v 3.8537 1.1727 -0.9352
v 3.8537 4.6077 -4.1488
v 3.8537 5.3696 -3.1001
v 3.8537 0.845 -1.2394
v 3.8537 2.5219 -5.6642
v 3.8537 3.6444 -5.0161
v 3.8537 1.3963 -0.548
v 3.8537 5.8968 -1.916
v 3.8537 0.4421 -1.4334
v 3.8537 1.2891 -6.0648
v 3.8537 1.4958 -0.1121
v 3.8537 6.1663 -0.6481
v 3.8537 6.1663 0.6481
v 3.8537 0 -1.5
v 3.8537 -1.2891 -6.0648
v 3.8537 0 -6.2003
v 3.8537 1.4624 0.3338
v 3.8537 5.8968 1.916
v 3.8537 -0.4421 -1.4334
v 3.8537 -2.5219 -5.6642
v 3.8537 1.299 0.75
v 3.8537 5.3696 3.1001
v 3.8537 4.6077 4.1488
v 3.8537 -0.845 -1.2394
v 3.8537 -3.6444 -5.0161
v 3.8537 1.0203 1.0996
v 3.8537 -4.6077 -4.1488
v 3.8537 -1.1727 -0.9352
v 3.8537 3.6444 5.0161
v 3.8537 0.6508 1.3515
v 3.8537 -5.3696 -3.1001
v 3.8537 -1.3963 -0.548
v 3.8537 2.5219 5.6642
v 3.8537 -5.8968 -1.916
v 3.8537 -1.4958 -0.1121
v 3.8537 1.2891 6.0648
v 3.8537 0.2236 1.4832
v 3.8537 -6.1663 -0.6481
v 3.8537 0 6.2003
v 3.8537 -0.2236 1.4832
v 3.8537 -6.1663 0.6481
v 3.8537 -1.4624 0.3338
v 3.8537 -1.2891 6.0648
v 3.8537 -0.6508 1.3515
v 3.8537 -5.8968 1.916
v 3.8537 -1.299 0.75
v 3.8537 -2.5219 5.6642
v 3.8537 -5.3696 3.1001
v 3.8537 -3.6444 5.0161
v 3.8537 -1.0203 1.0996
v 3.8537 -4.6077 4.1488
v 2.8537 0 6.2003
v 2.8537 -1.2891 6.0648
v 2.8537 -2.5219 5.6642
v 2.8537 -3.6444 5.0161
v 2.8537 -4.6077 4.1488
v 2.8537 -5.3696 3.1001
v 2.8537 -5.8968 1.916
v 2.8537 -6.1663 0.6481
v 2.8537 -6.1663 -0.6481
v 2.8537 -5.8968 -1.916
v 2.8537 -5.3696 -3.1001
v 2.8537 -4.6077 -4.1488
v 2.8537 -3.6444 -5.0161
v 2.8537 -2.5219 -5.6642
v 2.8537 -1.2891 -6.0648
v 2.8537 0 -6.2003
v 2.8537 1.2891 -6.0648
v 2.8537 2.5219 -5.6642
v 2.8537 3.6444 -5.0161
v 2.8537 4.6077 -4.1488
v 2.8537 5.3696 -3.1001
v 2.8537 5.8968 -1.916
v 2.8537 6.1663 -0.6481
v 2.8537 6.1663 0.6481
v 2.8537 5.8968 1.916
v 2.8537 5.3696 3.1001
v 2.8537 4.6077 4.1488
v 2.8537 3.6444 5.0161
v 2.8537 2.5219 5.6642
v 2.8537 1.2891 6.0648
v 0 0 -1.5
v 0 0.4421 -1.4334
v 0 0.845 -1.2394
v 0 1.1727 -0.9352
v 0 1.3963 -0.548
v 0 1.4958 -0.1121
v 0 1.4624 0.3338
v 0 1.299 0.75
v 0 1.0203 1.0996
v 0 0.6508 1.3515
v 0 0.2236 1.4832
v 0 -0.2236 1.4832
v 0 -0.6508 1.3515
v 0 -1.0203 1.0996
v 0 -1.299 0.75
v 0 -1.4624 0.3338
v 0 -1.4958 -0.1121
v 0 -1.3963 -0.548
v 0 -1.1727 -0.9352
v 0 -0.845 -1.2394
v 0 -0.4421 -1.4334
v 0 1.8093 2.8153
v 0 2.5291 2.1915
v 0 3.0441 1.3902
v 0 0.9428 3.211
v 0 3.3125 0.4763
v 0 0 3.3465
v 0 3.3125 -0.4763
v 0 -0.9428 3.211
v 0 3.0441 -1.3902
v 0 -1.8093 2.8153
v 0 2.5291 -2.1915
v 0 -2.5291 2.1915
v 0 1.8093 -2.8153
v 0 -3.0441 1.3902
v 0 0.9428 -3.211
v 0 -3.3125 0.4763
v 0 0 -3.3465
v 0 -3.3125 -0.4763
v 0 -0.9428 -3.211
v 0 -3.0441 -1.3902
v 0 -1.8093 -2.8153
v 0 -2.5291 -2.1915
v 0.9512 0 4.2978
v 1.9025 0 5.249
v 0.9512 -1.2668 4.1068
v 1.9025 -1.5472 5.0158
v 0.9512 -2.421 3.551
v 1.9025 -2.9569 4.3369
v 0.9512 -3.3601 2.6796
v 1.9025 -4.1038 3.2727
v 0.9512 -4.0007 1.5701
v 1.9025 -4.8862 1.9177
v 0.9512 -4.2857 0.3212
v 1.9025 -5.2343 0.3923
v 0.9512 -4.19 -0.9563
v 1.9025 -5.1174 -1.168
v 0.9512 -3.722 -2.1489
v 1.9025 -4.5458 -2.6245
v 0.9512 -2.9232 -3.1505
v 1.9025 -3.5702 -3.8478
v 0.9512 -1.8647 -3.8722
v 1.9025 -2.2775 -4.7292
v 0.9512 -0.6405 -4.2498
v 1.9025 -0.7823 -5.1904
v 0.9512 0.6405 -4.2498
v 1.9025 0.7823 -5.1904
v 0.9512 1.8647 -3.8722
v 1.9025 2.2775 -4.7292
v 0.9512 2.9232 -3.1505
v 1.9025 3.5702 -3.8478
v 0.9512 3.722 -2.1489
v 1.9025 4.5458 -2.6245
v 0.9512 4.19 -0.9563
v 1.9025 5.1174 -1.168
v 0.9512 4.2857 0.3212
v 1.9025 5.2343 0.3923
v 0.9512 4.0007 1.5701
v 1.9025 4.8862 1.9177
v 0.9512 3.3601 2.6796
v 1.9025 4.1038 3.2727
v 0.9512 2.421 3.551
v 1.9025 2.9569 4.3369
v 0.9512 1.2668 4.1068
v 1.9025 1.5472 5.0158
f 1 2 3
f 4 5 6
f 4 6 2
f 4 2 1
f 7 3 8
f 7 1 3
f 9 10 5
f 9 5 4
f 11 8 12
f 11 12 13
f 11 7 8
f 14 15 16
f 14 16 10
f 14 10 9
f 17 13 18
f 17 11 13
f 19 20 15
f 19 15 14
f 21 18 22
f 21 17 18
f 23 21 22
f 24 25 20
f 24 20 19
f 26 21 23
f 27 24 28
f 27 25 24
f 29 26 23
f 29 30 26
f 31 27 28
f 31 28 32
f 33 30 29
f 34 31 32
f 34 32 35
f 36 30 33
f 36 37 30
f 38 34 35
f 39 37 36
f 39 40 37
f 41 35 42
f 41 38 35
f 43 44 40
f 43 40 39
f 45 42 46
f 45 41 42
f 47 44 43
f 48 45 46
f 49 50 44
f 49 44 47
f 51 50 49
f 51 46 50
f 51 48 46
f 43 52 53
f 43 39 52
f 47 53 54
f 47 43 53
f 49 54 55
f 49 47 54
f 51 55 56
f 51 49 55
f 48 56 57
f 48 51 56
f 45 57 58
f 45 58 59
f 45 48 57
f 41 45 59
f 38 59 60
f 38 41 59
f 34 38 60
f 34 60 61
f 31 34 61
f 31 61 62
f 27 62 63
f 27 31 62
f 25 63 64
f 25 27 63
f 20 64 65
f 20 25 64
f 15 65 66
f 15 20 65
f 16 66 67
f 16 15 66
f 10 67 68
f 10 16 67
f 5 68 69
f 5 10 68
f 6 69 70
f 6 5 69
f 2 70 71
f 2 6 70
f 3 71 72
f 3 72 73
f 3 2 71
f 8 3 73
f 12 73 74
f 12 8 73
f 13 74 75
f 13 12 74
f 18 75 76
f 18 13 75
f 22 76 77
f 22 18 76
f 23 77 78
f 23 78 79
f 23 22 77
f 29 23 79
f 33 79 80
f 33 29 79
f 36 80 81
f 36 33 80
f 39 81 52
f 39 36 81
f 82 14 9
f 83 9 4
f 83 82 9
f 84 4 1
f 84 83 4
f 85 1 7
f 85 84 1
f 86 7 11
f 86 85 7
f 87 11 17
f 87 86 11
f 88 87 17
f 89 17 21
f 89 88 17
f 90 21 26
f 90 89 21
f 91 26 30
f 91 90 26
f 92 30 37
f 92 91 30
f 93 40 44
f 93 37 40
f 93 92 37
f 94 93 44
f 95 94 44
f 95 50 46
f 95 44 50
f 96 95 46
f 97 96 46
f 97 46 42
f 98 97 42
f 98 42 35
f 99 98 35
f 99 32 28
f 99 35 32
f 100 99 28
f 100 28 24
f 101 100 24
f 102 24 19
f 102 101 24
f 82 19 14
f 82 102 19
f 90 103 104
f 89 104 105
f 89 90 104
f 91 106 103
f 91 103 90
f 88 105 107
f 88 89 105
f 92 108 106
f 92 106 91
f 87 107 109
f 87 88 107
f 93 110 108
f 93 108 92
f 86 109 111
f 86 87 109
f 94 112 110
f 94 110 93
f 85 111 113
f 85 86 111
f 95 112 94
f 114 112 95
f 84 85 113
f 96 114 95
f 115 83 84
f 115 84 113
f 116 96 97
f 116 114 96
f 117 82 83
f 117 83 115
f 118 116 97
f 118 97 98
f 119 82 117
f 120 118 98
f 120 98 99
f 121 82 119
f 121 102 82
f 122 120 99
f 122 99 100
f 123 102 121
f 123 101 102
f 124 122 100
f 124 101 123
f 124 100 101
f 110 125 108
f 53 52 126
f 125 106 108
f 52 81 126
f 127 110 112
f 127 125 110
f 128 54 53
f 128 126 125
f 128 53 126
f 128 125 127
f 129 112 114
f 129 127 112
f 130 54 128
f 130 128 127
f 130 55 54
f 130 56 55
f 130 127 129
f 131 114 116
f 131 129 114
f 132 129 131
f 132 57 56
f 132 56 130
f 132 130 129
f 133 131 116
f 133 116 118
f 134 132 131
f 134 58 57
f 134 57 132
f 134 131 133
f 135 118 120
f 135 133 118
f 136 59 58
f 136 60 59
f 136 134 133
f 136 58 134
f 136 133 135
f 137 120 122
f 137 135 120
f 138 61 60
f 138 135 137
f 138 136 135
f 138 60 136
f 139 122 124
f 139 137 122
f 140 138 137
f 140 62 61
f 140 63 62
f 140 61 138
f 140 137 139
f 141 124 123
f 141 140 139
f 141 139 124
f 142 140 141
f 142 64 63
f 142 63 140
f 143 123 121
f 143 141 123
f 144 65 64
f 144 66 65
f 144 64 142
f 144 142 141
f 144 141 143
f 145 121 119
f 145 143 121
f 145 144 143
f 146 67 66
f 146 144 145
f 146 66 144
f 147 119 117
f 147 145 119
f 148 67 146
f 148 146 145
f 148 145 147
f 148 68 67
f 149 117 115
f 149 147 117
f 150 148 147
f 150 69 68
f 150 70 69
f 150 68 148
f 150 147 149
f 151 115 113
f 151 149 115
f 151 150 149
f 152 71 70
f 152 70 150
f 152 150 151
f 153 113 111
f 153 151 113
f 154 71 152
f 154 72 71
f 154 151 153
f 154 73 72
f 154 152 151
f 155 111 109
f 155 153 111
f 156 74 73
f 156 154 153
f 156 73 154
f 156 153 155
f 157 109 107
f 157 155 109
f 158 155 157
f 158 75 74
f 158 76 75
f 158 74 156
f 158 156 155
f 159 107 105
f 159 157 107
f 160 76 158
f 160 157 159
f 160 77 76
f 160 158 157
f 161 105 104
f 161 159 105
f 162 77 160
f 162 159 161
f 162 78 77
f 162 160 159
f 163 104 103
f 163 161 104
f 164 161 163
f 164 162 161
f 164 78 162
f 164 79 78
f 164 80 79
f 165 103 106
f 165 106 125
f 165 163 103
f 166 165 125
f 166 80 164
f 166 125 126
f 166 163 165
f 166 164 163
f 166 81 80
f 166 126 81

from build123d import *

# Parameters (mm, degrees)
CYLINDER_R           = 1.5
CYLINDER_DEPTH       = 10
CYLINDER_PITCH_ANGLE = 90


with BuildPart() as screwcutout:
    # Cylinder → Cylinder (new body)
    with BuildSketch(Plane.XY):
        Circle(CYLINDER_R)
    extrude(amount=CYLINDER_DEPTH)


with BuildPart() as screwcutout_1:
    # Cylinder pitch: moved
    add(screwcutout.part.rotate(Axis((0, 0, 0), (0, 1, 0)), CYLINDER_PITCH_ANGLE))


with BuildPart() as screwcutout_2:
    # Cylinder placement: moved
    add(screwcutout_1.part)


with BuildPart() as innerrace001:
    # Sketch002 → Revolution002 (revolve)
    with BuildSketch(Plane.XZ):
        Polygon((0, 3.346519), (2.853732, 6.200251), (3.853732, 6.200251), (3.853732, 0), (0, 0), align=None)
    revolve(axis=Axis((0, 0, 0), (1, 0, 0)))

    # Cut002: cut ScrewCutout
    add(screwcutout_2.part, mode=Mode.SUBTRACT)


solid = innerrace001.part
